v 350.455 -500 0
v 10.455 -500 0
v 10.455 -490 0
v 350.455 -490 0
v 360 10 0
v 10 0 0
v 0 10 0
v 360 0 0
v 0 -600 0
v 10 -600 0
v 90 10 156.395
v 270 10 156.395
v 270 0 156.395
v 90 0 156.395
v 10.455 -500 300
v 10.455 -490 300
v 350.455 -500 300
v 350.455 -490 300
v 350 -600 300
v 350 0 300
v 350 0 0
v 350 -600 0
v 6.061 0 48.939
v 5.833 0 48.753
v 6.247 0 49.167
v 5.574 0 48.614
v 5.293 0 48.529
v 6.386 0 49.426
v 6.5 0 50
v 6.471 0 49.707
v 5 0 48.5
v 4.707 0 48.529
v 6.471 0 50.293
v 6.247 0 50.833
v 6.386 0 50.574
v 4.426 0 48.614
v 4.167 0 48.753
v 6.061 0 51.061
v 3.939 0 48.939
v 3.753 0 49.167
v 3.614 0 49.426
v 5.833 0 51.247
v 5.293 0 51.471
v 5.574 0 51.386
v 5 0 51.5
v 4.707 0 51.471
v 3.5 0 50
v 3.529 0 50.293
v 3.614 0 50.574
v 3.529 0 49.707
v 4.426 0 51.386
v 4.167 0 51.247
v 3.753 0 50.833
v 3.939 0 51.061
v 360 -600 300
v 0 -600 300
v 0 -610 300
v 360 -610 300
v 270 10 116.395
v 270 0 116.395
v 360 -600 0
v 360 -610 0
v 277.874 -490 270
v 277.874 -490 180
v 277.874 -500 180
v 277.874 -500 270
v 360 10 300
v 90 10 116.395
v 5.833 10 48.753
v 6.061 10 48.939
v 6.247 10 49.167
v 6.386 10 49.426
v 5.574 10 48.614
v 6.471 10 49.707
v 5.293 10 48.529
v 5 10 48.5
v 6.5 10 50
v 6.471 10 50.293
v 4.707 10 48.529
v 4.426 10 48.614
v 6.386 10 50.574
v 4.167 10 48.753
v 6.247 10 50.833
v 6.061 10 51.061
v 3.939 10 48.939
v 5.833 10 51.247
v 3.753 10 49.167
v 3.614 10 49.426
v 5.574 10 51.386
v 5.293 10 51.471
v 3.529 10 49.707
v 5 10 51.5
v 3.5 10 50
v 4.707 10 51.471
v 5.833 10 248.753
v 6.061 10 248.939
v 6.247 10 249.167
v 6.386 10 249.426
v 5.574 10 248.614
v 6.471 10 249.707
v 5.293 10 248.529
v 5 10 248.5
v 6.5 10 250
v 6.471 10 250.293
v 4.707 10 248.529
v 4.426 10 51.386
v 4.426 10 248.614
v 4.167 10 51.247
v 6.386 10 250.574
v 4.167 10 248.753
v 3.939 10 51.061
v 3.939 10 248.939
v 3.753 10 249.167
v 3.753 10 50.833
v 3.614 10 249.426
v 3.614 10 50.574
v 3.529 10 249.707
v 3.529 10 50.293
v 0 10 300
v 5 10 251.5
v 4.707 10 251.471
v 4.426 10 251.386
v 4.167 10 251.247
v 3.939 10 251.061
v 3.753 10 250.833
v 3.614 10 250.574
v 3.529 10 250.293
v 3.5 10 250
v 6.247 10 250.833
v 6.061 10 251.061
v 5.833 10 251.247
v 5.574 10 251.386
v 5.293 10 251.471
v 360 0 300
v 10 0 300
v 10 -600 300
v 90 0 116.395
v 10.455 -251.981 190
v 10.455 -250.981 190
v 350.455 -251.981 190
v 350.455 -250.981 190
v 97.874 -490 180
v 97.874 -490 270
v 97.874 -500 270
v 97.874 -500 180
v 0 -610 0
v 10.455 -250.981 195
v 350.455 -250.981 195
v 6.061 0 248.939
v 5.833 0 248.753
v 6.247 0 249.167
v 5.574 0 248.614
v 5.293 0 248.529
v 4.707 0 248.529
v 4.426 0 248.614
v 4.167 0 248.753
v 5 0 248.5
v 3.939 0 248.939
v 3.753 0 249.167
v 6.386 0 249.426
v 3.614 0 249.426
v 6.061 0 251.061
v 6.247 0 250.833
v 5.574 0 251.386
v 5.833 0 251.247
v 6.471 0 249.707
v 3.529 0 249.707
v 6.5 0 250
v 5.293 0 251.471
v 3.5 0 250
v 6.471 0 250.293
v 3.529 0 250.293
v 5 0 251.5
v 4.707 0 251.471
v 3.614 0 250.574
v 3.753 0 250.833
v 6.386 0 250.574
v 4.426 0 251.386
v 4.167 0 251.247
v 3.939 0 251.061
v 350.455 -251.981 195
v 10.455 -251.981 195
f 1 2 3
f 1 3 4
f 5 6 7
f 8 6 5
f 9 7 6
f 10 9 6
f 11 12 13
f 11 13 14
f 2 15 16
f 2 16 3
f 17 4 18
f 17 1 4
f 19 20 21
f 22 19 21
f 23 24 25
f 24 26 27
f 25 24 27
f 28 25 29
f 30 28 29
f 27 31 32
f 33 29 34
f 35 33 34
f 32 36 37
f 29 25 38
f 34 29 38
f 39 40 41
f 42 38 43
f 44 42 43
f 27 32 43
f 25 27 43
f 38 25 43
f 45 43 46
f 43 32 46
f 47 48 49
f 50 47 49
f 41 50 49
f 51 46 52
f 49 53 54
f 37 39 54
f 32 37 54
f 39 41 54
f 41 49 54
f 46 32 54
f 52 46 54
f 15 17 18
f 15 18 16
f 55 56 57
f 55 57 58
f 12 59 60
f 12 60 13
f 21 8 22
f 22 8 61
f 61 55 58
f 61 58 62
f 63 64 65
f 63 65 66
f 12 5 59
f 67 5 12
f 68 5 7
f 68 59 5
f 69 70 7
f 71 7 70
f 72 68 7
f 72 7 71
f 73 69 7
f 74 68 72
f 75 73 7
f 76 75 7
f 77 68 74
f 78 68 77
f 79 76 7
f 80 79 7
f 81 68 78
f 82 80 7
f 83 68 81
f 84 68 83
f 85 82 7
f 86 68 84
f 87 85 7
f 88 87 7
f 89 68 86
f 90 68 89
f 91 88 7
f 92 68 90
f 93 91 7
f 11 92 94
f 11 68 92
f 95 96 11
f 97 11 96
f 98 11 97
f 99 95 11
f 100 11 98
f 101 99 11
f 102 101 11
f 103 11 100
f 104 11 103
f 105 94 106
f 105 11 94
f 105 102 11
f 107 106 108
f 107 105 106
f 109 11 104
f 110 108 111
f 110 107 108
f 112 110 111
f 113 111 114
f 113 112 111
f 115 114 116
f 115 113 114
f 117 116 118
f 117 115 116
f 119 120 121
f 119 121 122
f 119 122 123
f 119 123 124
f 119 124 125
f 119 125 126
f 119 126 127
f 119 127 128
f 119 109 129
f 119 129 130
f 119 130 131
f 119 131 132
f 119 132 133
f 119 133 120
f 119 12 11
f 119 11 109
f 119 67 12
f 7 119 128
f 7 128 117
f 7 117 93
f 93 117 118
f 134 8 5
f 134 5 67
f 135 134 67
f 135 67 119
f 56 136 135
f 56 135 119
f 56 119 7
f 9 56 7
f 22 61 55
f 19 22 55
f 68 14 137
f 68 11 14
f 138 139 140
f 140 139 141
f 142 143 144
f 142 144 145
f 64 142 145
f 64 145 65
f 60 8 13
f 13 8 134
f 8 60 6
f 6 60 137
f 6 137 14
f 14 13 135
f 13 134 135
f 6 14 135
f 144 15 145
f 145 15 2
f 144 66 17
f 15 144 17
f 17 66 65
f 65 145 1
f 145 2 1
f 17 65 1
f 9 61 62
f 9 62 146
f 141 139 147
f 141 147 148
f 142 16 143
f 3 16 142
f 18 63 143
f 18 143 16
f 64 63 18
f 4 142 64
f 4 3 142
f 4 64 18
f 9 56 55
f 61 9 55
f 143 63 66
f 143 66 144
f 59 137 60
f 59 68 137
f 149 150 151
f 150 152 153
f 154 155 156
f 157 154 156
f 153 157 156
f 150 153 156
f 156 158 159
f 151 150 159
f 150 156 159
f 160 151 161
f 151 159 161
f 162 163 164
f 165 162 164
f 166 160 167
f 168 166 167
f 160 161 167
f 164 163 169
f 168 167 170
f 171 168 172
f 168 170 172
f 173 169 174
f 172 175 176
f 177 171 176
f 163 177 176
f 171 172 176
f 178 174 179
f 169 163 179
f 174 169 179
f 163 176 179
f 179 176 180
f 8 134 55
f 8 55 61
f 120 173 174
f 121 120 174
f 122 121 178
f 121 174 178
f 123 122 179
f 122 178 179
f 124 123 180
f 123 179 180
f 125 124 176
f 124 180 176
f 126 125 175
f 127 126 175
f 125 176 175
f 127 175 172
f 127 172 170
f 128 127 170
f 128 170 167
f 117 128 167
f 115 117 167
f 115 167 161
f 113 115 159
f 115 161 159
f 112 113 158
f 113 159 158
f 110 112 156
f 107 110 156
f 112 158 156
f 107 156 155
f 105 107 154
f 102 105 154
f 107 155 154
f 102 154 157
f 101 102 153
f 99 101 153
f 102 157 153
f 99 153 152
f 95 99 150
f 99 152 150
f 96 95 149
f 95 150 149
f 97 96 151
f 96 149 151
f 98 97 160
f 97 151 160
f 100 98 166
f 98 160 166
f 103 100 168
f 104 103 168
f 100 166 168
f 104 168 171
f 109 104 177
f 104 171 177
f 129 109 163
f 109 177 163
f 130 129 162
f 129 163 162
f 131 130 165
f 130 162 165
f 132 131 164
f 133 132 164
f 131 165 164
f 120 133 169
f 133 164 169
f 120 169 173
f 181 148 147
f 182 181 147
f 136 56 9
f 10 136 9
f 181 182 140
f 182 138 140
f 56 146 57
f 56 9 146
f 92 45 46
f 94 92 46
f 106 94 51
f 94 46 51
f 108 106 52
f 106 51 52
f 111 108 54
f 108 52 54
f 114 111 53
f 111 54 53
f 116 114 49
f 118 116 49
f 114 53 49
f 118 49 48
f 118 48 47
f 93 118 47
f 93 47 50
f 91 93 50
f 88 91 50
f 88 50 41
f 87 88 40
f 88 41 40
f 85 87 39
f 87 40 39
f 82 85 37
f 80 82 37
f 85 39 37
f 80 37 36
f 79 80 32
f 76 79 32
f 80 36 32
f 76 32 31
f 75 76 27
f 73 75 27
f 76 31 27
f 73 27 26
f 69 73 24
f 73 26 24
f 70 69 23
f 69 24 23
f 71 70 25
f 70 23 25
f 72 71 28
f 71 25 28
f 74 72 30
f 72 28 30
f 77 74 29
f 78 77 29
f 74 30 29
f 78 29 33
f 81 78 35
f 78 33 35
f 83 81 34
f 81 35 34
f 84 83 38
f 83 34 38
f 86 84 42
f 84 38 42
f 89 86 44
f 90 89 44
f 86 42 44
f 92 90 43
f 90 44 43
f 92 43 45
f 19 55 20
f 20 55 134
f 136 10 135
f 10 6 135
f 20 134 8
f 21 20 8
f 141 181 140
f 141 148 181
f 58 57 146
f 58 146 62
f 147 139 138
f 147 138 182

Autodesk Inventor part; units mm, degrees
ref_plane "YZ Plane" through (0, 0, 0) normal (1, 0, 0) x (0, 1, 0)
ref_plane "XZ Plane" through (0, 0, 0) normal (0, 1, 0) x (-1, 0, 0)
ref_plane "XY Plane" through (0, 0, 0) normal (0, 0, 1) x (1, 0, 0)
sketch "Skizze2" plane through (0, 0, 0) normal (0, 1, 0) x (-1, 0, 0)
  line L0 (-360, 300) -> (0, 300)
  line L1 (0, 300) -> (0, 0)
  line L2 (0, 0) -> (-360, 0)
  line L3 (-360, 0) -> (-360, 300)
  line L4 (-360, 300) -> (0, 0) construction
  line L5 (0, 300) -> (-360, 0) construction
  point P0 (-180, 150)
  dimension "d6" = 360
  dimension "d7" = 300
extrude "Deckel oben" add sketch "Skizze2" along normal blind 10
hole "Bohrung1" at (5, 10, 50) direction (0, -1, 0) diameter 3 depth 20 tip angle 118
hole "Bohrung2" at (5, 10, 250) direction (0, -1, 0) diameter 3 depth 20 tip angle 118
ref_plane "Arbeitsebene5" through (185, -600, 0) normal (0, -1, 0) x (1, 0, 0)
sketch "Skizze8" plane through (185, -600, 0) normal (0, -1, 0) x (1, 0, 0)
  line L0 (-185, 300) -> (175, 300)
  line L1 (175, 300) -> (175, 0)
  line L2 (175, 0) -> (-185, 0)
  line L3 (-185, 0) -> (-185, 300)
  line L4 (-185, 300) -> (175, 0) construction
  line L5 (175, 300) -> (-185, 0) construction
  point P0 (-5, 150)
  dimension "d30" = 360
  dimension "d31" = 300
extrude "Boden" add sketch "Skizze8" along normal blind 10 separate body
sketch "Skizze9" plane through (360, 305, 300) normal (1, 0, 0) x (0, 0, -1)
  line L0 (0, -305) -> (300, -305)
  line L1 (300, -305) -> (300, -905)
  line L2 (300, -905) -> (0, -905)
  line L3 (0, -905) -> (0, -305)
  point P0 (300, -305)
  dimension "d35" = 600
  dimension "d60" = 300
  dimension "d63" = 0
extrude "Linke Wand" add sketch "Skizze9" against normal blind 10 separate body
ref_plane "Arbeitsebene4" through (185, -500, 0) normal (0, 1, 0) x (1, 0, 0)
sketch "Skizze10" plane through (190, -500, 100) normal (0, 1, 0) x (1, 0, 0)
  line L0 (-179.5454, 100) -> (160.4546, 100)
  line L1 (160.4546, 100) -> (160.4546, -200)
  line L2 (160.4546, -200) -> (-179.5454, -200)
  line L3 (-179.5454, -200) -> (-179.5454, 100)
  line L4 (-179.5454, 100) -> (160.4546, -200) construction
  line L5 (160.4546, 100) -> (-179.5454, -200) construction
  line L6 (-190, 100) -> (170, 100) projected
  point P0 (-9.5454, -50)
  dimension "d40" = 340
  dimension "d41" = 300
  dimension "d65" = 0
extrude "Zwischenboden" add sketch "Skizze10" along normal blind 10 separate body
sketch "Skizze11" plane through (0, 610, 0) normal (-1, 0, 0) x (0, 0, 1)
  line L0 (0, -610) -> (300, -610)
  line L1 (300, -610) -> (300, -1210)
  line L2 (300, -1210) -> (0, -1210)
  line L3 (0, -1210) -> (0, -610)
  point P0 (300, -610)
  dimension "d45" = 600
  dimension "d61" = 300
  dimension "d64" = 0
extrude "Rechte Wand" add sketch "Skizze11" against normal blind 10 bodies 1
sketch "Skizze15" plane through (190, -490, 100) normal (0, 1, 0) x (1, 0, 0)
  line L0 (-92.1258, -80) -> (87.8742, -80)
  line L1 (87.8742, -80) -> (87.8742, -170)
  line L2 (87.8742, -170) -> (-92.1258, -170)
  line L3 (-92.1258, -170) -> (-92.1258, -80)
  line L4 (-92.1258, -80) -> (87.8742, -170) construction
  line L5 (87.8742, -80) -> (-92.1258, -170) construction
  circle A0 centre (-185, -150) radius 1.5 projected
  circle A1 centre (-185, 50) radius 1.5 projected
  line L6 (-190, -200) -> (170, -200) projected
  line L7 (170, -200) -> (170, 100) projected
  line L8 (170, 100) -> (-190, 100) projected
  line L9 (-190, 100) -> (-190, -200) projected
  line L10 (170, 100) -> (-190, 100) projected
  line L11 (170, -200) -> (170, 100) projected
  point P0 (-2.1258, -125)
  dimension "d57" = 180
  dimension "d59" = 90
  dimension "d62" = 30
extrude "Abtropfgitter" cut sketch "Skizze15" against normal blind 20 contours L0 L1 L2 L3 bodies 4
sketch "Skizze16" plane through (0, 10, 0) normal (0, 1, 0) x (1, 0, 0)
  line L0 (50.5996, -54.7496) -> (230.5977, -55.5818) projected
  line L1 (230.5289, -70.4701) -> (50.5308, -69.6379) projected
  line L2 (90, -116.3949) -> (270, -116.3949)
  line L3 (270, -116.3949) -> (270, -156.3949)
  line L4 (270, -156.3949) -> (90, -156.3949)
  line L5 (90, -156.3949) -> (90, -116.3949)
  dimension "d71" = 40
  dimension "d72" = 180
extrude "öffnung oben" cut sketch "Skizze16" against normal blind 50 bodies 1
ref_plane "Arbeitsebene7" through (180, -250.9808, 190.5) normal (0, 1, 0) x (1, 0, 0)
sketch "Skizze17" plane through (180, -250.9808, 190.5) normal (0, 1, 0) x (1, 0, 0)
  line L0 (-25.2697, 55.6344) -> (-54.2694, 55.7685) projected
  line L1 (-169.5454, 190.5) -> (-169.5454, -109.5) projected
  line L2 (170.4546, -109.5) -> (170.4546, 190.5) projected
  line L3 (-169.5454, 0.5) -> (170.4546, 0.5)
  line L4 (170.4546, 0.5) -> (170.4546, -4.5)
  line L5 (170.4546, -4.5) -> (-169.5454, -4.5)
  line L6 (-169.5454, -4.5) -> (-169.5454, 0.5)
  point P0 (-180, 190.5)
  dimension "d75" = 5
  dimension "d76" = 340
extrude "ventilhalter stange" add sketch "Skizze17" against normal blind 1 bodies 4
properties part number "Spanplatten Gehäuse" material "Edelstahl, 440C"
